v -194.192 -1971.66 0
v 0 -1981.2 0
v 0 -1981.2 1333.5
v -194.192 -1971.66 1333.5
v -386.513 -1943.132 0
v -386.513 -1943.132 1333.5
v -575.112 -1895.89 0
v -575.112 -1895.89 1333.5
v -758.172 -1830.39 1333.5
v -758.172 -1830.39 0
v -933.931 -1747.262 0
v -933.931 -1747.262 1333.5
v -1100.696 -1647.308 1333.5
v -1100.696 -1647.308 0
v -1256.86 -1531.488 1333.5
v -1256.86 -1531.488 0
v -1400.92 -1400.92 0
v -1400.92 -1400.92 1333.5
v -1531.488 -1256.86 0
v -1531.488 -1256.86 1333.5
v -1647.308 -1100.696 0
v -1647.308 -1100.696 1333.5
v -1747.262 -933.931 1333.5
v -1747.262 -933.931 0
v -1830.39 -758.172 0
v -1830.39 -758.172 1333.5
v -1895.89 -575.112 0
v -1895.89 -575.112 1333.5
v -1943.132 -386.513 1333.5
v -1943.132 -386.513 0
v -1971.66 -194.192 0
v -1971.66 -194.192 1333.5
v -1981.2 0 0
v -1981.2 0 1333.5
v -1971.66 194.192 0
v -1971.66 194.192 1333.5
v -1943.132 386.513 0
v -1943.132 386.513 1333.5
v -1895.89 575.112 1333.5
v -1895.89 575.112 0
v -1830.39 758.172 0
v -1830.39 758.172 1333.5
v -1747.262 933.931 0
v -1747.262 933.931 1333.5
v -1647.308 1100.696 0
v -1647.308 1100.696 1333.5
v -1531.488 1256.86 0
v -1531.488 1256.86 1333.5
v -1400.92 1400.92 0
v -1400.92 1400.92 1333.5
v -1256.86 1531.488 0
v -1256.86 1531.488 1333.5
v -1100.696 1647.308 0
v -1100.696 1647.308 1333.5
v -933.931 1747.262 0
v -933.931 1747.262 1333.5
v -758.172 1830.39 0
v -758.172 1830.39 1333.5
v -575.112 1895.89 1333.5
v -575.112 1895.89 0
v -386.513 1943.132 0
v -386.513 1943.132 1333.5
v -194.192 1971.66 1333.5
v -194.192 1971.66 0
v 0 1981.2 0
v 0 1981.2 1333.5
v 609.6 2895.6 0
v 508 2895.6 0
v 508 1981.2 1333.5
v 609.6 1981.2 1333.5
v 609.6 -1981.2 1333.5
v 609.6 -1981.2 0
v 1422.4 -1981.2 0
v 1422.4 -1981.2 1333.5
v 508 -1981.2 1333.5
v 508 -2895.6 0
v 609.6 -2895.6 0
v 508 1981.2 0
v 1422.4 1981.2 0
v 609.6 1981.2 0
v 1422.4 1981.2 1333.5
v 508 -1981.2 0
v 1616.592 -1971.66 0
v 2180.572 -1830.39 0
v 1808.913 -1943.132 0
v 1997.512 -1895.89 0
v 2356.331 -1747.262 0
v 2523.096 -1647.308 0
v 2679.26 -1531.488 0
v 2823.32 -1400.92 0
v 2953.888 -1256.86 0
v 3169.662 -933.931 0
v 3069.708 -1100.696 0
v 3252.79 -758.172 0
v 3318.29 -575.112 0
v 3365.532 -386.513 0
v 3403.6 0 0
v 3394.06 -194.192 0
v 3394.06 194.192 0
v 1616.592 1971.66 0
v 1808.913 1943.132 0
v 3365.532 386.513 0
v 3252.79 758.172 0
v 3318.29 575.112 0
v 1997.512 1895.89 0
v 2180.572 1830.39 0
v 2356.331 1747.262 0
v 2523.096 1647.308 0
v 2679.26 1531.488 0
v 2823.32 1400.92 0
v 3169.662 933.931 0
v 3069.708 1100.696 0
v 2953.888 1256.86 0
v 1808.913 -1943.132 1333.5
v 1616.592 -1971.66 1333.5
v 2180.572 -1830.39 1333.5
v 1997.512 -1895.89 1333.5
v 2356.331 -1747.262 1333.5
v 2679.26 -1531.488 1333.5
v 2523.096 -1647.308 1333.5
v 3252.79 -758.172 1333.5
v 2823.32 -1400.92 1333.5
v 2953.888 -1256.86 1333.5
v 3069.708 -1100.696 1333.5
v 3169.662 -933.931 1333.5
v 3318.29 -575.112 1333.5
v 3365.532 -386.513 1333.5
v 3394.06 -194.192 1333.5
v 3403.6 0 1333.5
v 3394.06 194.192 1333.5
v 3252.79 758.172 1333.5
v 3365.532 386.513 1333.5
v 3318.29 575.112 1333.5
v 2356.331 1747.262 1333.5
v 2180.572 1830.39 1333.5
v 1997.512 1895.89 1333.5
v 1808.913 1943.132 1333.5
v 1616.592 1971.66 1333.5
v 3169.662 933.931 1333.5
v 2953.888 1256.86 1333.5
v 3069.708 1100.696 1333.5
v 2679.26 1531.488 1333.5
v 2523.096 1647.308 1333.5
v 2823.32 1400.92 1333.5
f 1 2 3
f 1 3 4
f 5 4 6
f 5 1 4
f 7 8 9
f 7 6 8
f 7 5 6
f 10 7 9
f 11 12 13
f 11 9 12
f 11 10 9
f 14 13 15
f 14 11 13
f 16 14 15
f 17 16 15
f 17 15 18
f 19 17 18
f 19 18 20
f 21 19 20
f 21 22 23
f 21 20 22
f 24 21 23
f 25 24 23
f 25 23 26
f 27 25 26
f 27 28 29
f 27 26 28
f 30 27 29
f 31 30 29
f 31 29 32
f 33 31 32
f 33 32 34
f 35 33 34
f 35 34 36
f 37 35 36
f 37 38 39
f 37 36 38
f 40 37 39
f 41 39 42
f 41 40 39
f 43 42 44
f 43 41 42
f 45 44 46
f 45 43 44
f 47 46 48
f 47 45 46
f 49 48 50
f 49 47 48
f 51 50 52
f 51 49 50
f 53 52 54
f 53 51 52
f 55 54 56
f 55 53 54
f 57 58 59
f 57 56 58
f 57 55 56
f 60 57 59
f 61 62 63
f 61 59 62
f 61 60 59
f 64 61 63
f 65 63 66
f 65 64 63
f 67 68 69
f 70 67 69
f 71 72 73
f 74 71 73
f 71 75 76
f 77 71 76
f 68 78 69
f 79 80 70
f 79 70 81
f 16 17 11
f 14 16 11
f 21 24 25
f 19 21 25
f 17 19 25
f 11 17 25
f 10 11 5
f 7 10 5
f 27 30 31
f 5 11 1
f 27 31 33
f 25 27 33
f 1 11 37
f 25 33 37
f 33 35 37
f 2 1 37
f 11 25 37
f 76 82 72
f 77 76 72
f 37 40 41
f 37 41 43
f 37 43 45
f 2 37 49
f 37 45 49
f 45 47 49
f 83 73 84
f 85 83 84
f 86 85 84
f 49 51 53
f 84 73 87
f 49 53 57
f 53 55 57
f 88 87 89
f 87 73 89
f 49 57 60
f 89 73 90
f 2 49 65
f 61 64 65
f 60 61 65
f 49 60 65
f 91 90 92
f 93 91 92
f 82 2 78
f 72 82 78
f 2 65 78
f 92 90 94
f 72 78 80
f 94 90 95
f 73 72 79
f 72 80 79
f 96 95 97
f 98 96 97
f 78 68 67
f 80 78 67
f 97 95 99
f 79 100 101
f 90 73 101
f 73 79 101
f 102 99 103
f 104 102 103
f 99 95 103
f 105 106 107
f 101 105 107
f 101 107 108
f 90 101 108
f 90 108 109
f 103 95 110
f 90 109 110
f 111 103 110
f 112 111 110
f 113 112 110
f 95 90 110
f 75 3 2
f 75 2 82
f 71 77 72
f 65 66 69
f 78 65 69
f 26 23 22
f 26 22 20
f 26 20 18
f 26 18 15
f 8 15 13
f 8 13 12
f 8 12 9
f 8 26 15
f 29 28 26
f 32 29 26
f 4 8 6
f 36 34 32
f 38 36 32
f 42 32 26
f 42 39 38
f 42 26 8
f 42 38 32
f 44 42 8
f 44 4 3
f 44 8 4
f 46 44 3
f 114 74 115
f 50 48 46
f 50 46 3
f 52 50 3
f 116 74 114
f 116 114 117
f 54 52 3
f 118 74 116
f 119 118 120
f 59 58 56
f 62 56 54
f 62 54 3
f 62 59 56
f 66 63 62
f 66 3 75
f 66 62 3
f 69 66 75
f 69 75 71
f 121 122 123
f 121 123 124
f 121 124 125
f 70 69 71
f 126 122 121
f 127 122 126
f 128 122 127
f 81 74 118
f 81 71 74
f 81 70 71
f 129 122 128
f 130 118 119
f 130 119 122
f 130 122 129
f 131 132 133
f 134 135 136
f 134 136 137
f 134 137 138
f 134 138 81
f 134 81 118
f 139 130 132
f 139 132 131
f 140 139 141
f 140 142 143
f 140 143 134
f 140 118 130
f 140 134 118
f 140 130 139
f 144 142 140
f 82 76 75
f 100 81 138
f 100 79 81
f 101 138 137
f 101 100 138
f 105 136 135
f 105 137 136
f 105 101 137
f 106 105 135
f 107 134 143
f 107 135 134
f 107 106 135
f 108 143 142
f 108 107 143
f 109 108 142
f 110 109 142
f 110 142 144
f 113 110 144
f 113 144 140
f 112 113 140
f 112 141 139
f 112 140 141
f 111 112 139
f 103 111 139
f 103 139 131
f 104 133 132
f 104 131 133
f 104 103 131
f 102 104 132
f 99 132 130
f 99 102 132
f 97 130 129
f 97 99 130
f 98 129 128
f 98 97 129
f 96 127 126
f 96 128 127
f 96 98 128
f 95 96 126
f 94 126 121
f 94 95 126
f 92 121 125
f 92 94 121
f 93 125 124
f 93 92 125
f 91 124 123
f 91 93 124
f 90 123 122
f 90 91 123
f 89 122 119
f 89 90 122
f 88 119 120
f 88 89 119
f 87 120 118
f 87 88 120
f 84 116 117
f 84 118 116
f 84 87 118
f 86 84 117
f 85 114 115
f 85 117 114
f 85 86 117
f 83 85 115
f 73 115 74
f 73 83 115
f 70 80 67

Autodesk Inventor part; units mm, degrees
ref_plane "XZ Plane" through (0, 0, 0) normal (0, 1, 0) x (-1, 0, 0)
ref_plane "XY Plane" through (0, 0, 0) normal (0, 0, 1) x (1, 0, 0)
sketch "Sketch4" plane through (0, 0, 0) normal (0, 0, 1) x (1, 0, 0)
  arc A0 (0, 1981.2) -> (0, -1981.2) centre (0, 0) ccw
  arc A1 (1422.4, -1981.2) -> (1422.4, 1981.2) centre (1422.4, 0) ccw
  line L0 (0, 1981.2) -> (1422.4, 1981.2)
  line L1 (0, -1981.2) -> (1603.6466, -1981.2)
  dimension "d12" = 3962.4
  dimension "d13" = 3962.4
extrude "Extrusion3" add sketch "Sketch4" along normal blind 12.7
sketch "Sketch6" plane through (0, 0, 12.7) normal (0, 0, 1) x (1, 0, 0)
  arc A0 (0, 1981.2) -> (0, -1981.2) centre (0, 0) ccw projected
  arc A1 (0, 1981.2) -> (0, -1981.2) centre (0, 0) ccw
  line L0 (0, -1981.2) -> (1422.4, -1981.2) projected
  arc A2 (1422.4, -1981.2) -> (1422.4, 1981.2) centre (1422.4, 0) ccw projected
  arc A3 (1422.4, -1981.2) -> (1422.4, 1981.2) centre (1422.4, 0) ccw
  line L1 (0, 1981.2) -> (1422.4, 1981.2)
  line L2 (0, -1981.2) -> (1422.4, -1981.2)
  arc A4 (0, 1968.5) -> (0, -1968.5) centre (0, 0) ccw
  arc A5 (1422.4, -1968.5) -> (1422.4, 1968.5) centre (1422.4, 0) ccw
  line L3 (1422.4, 0) -> (1422.4, -1968.5) construction
  line L4 (1422.4, 0) -> (3390.9, 0) construction
  line L5 (0, 1968.5) -> (1422.4, 1968.5)
  line L6 (0, -1968.5) -> (1422.4, -1968.5)
  dimension "d18" = 1968.5
  dimension "d19" = 1968.5
  dimension "d20" = 90
extrude "Extrusion4" add sketch "Sketch6" along normal blind 1320.8 contours L1 A2 L0 A0 | L5 A5 L6 A4
ref_plane "Work Plane1" through (508, 0, 0) normal (1, 0, 0) x (0, 1, 0)
sketch "Sketch8" plane through (508, 0, 0) normal (1, 0, 0) x (0, 1, 0)
  line L0 (1981.2, 0) -> (1981.2, 1333.5) projected
  line L1 (1981.2, 0) -> (2895.6, 0)
  line L2 (2895.6, 0) -> (1981.2, 1333.5)
  line L3 (1981.2, 1333.5) -> (1981.2, 0)
  line L4 (1981.2, 1333.5) -> (1981.2, 0)
  point P0 (0, 0)
  dimension "d24" = 914.4
extrude "Extrusion5" add sketch "Sketch8" along normal blind 101.6
mirror "Mirror1" about plane through (0, 0, 0) normal (0, 1, 0) of "Extrusion5"
properties part number "EspritOvalPool"
